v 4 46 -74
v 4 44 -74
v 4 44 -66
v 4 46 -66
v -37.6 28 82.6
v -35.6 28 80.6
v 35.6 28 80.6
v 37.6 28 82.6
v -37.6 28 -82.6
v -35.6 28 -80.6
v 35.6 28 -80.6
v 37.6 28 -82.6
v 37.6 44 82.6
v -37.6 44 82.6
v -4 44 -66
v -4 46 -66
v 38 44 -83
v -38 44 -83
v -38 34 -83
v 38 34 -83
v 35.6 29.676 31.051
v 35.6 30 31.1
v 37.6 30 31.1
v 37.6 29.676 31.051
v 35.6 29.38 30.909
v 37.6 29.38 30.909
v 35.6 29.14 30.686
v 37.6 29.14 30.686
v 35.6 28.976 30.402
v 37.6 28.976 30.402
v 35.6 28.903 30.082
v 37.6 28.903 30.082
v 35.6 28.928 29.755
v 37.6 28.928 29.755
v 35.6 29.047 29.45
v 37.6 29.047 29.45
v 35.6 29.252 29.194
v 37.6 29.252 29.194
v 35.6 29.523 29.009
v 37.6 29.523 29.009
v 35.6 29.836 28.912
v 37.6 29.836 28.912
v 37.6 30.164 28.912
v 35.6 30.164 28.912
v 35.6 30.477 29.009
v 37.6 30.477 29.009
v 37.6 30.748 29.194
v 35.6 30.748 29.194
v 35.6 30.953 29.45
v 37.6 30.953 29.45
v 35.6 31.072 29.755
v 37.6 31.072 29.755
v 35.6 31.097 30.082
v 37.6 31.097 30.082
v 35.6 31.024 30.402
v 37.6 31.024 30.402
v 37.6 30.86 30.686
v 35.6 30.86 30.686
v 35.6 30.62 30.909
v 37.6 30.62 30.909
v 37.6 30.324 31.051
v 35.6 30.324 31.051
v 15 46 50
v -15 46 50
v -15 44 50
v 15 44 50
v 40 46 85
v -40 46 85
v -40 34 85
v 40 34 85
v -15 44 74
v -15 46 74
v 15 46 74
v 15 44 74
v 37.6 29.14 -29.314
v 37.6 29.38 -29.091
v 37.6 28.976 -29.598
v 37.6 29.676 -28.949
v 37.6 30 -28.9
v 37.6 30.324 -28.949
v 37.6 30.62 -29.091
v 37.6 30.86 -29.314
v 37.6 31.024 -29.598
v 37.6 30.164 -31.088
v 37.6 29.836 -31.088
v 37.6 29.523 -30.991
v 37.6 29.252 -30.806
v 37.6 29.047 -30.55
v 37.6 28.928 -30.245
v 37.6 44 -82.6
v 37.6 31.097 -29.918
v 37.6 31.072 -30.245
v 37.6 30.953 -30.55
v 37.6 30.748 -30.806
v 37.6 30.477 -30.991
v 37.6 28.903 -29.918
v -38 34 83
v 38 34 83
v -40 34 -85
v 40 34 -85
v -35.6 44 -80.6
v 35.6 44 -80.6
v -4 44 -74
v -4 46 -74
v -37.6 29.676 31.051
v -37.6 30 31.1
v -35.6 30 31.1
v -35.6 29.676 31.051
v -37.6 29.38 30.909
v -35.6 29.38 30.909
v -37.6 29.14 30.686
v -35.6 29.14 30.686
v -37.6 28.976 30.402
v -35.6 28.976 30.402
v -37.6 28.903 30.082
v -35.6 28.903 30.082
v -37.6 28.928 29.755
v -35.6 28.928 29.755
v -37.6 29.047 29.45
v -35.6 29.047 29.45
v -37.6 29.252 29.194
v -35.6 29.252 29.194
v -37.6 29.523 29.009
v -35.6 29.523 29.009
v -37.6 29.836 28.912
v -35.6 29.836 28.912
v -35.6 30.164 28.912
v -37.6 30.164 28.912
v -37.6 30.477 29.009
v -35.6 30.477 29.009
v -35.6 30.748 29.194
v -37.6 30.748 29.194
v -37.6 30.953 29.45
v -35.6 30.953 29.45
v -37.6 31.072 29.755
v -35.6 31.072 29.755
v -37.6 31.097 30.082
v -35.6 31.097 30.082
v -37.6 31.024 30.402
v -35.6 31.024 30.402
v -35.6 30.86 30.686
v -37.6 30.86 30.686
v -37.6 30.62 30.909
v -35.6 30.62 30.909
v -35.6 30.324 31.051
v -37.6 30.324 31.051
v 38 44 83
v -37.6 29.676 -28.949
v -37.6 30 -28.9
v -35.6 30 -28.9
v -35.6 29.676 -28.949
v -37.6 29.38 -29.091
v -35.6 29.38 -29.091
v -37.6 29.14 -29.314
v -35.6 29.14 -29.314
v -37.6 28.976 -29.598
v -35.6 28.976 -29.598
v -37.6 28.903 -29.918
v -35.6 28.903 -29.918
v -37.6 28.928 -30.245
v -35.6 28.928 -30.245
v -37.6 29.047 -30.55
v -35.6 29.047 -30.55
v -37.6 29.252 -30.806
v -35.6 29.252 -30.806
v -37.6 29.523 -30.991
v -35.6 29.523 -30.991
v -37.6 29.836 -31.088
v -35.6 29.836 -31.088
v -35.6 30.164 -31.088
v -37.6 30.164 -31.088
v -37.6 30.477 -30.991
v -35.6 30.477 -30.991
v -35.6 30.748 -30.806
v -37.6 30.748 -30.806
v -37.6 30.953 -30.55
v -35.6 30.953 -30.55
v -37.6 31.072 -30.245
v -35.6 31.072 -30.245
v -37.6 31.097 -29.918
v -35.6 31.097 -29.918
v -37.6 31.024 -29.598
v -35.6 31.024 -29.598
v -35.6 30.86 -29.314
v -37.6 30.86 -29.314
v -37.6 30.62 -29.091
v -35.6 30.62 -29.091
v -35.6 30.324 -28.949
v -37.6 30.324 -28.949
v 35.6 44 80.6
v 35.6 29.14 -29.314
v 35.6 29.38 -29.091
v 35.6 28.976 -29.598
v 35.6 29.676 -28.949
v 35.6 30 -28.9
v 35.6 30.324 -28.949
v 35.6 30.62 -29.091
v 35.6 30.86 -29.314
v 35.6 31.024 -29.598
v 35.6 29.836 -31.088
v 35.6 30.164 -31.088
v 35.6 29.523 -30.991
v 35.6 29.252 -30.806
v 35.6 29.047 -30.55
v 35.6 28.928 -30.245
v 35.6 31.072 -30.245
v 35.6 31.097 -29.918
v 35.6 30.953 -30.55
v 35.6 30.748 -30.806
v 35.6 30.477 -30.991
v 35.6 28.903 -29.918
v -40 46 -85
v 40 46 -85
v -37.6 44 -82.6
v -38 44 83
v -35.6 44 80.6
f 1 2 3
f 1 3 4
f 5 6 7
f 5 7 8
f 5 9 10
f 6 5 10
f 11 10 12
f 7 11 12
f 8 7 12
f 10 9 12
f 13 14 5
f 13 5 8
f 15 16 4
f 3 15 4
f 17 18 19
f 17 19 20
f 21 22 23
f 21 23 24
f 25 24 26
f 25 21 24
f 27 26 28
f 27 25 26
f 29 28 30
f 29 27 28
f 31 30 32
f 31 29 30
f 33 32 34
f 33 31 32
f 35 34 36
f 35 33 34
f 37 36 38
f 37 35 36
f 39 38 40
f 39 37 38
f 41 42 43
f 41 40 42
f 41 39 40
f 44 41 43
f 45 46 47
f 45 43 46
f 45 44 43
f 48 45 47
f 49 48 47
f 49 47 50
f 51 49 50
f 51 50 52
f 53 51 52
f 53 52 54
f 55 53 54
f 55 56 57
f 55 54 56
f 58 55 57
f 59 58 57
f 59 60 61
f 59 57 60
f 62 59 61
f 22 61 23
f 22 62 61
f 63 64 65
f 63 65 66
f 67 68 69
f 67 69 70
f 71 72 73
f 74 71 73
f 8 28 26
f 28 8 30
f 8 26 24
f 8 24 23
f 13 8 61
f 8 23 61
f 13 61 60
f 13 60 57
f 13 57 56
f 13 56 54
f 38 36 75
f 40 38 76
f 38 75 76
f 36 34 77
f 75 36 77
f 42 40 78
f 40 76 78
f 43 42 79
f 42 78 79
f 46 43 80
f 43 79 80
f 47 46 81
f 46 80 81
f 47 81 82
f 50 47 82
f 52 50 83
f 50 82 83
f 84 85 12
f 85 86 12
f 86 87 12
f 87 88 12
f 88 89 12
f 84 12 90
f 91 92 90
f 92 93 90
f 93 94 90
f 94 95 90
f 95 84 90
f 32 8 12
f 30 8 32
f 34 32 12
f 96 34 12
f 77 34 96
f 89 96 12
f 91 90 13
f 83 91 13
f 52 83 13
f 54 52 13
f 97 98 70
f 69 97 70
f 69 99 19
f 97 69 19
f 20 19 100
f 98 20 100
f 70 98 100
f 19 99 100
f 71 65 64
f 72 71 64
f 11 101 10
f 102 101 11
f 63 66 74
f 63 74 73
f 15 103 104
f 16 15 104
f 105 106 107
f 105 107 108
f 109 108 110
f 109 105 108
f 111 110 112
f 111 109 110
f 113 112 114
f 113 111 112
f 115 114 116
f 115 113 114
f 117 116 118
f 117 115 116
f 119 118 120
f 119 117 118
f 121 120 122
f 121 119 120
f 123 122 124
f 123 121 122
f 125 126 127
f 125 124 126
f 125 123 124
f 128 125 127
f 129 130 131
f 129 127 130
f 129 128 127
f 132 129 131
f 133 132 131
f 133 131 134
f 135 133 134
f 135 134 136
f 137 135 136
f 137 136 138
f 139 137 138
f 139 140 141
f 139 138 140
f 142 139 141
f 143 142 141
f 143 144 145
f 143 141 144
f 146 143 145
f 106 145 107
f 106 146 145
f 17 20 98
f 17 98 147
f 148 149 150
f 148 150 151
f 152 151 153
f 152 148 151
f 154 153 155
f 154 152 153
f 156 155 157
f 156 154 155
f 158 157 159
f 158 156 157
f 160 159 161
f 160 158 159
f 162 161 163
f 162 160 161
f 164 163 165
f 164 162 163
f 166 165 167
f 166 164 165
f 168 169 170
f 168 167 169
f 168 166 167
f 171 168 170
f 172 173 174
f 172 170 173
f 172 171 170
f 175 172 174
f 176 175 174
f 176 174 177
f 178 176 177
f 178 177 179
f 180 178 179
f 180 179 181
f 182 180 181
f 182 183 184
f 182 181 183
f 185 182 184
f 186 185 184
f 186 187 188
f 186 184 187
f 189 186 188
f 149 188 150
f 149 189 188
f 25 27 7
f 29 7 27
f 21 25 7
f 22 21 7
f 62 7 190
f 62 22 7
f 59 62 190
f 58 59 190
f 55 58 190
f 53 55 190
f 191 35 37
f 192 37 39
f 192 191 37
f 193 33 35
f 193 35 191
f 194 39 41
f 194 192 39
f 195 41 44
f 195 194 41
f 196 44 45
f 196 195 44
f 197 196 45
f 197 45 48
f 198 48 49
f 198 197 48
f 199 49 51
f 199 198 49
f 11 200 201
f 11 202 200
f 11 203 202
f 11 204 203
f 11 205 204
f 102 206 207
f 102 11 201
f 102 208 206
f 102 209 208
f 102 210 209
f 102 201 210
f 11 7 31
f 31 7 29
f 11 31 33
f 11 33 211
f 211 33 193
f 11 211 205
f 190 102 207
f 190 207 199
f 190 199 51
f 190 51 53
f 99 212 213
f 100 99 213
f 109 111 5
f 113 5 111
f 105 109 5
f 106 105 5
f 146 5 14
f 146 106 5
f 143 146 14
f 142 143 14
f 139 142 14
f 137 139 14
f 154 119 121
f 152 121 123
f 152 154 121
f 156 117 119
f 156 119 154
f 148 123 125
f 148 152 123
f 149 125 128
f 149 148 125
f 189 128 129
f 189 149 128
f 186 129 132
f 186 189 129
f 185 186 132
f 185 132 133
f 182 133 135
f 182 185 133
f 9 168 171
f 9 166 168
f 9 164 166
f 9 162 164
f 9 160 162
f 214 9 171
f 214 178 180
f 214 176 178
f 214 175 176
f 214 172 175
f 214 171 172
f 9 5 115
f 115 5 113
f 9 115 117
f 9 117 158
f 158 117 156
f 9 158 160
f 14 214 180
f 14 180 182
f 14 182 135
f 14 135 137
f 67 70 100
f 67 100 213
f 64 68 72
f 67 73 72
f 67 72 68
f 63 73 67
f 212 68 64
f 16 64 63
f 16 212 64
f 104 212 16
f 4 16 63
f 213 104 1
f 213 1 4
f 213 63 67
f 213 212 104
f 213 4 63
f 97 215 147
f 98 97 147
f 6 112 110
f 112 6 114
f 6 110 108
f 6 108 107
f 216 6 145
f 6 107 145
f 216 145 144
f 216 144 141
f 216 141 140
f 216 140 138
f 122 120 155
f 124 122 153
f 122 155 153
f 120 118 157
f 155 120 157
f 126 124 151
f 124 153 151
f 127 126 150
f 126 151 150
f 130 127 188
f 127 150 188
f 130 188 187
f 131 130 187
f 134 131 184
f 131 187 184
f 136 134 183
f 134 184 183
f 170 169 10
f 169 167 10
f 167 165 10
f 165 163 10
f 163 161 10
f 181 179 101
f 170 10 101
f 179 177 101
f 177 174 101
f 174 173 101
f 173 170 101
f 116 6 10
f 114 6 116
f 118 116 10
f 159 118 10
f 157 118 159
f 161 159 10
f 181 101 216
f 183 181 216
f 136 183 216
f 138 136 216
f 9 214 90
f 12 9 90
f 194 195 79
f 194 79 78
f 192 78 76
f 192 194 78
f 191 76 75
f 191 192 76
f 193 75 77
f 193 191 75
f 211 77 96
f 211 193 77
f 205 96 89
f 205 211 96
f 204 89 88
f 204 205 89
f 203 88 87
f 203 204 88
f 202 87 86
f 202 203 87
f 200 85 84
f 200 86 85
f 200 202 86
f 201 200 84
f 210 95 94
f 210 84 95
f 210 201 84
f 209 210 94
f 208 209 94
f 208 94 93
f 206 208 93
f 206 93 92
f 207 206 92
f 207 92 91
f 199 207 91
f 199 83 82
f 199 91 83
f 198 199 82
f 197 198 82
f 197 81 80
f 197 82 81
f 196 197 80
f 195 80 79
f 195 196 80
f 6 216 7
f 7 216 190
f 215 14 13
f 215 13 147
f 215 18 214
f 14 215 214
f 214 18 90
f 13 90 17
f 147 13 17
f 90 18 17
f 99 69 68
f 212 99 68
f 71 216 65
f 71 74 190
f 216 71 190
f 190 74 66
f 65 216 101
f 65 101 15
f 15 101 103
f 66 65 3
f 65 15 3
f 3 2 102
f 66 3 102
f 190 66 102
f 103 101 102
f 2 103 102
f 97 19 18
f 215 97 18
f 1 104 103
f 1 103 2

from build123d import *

# Parameters (mm, degrees)
BOSS_EXTRUDE1_START = -85
SKETCH1_W           = 80
SKETCH1_H           = 12
BOSS_EXTRUDE1_DEPTH = 170
BOSS_EXTRUDE2_START = -83
SKETCH2_W           = 76
SKETCH2_H           = 14
BOSS_EXTRUDE2_DEPTH = 166
BOSS_EXTRUDE3_START = -82.6
SKETCH3_W           = 75.2
SKETCH3_H           = 16.5
BOSS_EXTRUDE3_DEPTH = 165.2
BOSS_EXTRUDE4_START = -80.6
SKETCH4_W           = 71.2
SKETCH4_H           = 17
BOSS_EXTRUDE4_DEPTH = 161.2
BOSS_EXTRUDE5_START = 50
SKETCH5_W           = 30
SKETCH5_H           = 10
BOSS_EXTRUDE5_DEPTH = 24
BOSS_EXTRUDE6_START = -74
SKETCH6_W           = 8
SKETCH6_H           = 10
BOSS_EXTRUDE6_DEPTH = 8
BOSS_EXTRUDE7_START = -45
SKETCH7_R           = 1.1
BOSS_EXTRUDE7_DEPTH = 90
BOSS_EXTRUDE8_START = -45
SKETCH8_R           = 1.1
BOSS_EXTRUDE8_DEPTH = 90


with BuildPart() as part:
    # Sketch1 → Boss-Extrude1 (new body)
    with BuildSketch(Plane.XY.offset(BOSS_EXTRUDE1_START)):
        with Locations((0, 40)):
            Rectangle(SKETCH1_W, SKETCH1_H)
    extrude(amount=BOSS_EXTRUDE1_DEPTH)


with BuildPart() as body_2:
    # Sketch2 → Boss-Extrude2 (new body)
    with BuildSketch(Plane.XY.offset(BOSS_EXTRUDE2_START)):
        with Locations((0, 37)):
            Rectangle(SKETCH2_W, SKETCH2_H)
    extrude(amount=BOSS_EXTRUDE2_DEPTH)


with BuildPart() as part_1:
    add(part.part)

    # Combine1: cut body 2
    add(body_2.part, mode=Mode.SUBTRACT)

    # Sketch3 → Boss-Extrude3 (add)
    with BuildSketch(Plane.XY.offset(BOSS_EXTRUDE3_START)):
        with Locations((0, 36.25)):
            Rectangle(SKETCH3_W, SKETCH3_H)
    extrude(amount=BOSS_EXTRUDE3_DEPTH)


with BuildPart() as body_2_2:
    # Sketch4 → Boss-Extrude4 (new body)
    with BuildSketch(Plane.XY.offset(BOSS_EXTRUDE4_START)):
        with Locations((0, 35.5)):
            Rectangle(SKETCH4_W, SKETCH4_H)
    extrude(amount=BOSS_EXTRUDE4_DEPTH)


with BuildPart() as part_2:
    add(part_1.part)

    # Combine2: cut body 2 2
    add(body_2_2.part, mode=Mode.SUBTRACT)


with BuildPart() as body_2_3:
    # Sketch5 → Boss-Extrude5 (new body)
    with BuildSketch(Plane.XY.offset(BOSS_EXTRUDE5_START)):
        with Locations((0, 45)):
            Rectangle(SKETCH5_W, SKETCH5_H)
    extrude(amount=BOSS_EXTRUDE5_DEPTH)


with BuildPart() as part_3:
    add(part_2.part)

    # Combine3: cut body 2 3
    add(body_2_3.part, mode=Mode.SUBTRACT)


with BuildPart() as body_2_4:
    # Sketch6 → Boss-Extrude6 (new body)
    with BuildSketch(Plane.XY.offset(BOSS_EXTRUDE6_START)):
        with Locations((0, 45)):
            Rectangle(SKETCH6_W, SKETCH6_H)
    extrude(amount=BOSS_EXTRUDE6_DEPTH)


with BuildPart() as part_4:
    add(part_3.part)

    # Combine4: cut body 2 4
    add(body_2_4.part, mode=Mode.SUBTRACT)


with BuildPart() as body_2_5:
    # Sketch7 → Boss-Extrude7 (new body)
    with BuildSketch(Plane(origin=(0, 0, 0), x_dir=(0, 0, -1), z_dir=(1, 0, 0)).offset(BOSS_EXTRUDE7_START)):
        with Locations((30, 30)):
            Circle(SKETCH7_R)
    extrude(amount=BOSS_EXTRUDE7_DEPTH)


with BuildPart() as part_5:
    add(part_4.part)

    # Combine5: cut body 2 5
    add(body_2_5.part, mode=Mode.SUBTRACT)


with BuildPart() as body_2_6:
    # Sketch8 → Boss-Extrude8 (new body)
    with BuildSketch(Plane(origin=(0, 0, 0), x_dir=(0, 0, -1), z_dir=(1, 0, 0)).offset(BOSS_EXTRUDE8_START)):
        with Locations((-30, 30)):
            Circle(SKETCH8_R)
    extrude(amount=BOSS_EXTRUDE8_DEPTH)


with BuildPart() as part_6:
    add(part_5.part)

    # Combine6: cut body 2 6
    add(body_2_6.part, mode=Mode.SUBTRACT)


solid = part_6.part
